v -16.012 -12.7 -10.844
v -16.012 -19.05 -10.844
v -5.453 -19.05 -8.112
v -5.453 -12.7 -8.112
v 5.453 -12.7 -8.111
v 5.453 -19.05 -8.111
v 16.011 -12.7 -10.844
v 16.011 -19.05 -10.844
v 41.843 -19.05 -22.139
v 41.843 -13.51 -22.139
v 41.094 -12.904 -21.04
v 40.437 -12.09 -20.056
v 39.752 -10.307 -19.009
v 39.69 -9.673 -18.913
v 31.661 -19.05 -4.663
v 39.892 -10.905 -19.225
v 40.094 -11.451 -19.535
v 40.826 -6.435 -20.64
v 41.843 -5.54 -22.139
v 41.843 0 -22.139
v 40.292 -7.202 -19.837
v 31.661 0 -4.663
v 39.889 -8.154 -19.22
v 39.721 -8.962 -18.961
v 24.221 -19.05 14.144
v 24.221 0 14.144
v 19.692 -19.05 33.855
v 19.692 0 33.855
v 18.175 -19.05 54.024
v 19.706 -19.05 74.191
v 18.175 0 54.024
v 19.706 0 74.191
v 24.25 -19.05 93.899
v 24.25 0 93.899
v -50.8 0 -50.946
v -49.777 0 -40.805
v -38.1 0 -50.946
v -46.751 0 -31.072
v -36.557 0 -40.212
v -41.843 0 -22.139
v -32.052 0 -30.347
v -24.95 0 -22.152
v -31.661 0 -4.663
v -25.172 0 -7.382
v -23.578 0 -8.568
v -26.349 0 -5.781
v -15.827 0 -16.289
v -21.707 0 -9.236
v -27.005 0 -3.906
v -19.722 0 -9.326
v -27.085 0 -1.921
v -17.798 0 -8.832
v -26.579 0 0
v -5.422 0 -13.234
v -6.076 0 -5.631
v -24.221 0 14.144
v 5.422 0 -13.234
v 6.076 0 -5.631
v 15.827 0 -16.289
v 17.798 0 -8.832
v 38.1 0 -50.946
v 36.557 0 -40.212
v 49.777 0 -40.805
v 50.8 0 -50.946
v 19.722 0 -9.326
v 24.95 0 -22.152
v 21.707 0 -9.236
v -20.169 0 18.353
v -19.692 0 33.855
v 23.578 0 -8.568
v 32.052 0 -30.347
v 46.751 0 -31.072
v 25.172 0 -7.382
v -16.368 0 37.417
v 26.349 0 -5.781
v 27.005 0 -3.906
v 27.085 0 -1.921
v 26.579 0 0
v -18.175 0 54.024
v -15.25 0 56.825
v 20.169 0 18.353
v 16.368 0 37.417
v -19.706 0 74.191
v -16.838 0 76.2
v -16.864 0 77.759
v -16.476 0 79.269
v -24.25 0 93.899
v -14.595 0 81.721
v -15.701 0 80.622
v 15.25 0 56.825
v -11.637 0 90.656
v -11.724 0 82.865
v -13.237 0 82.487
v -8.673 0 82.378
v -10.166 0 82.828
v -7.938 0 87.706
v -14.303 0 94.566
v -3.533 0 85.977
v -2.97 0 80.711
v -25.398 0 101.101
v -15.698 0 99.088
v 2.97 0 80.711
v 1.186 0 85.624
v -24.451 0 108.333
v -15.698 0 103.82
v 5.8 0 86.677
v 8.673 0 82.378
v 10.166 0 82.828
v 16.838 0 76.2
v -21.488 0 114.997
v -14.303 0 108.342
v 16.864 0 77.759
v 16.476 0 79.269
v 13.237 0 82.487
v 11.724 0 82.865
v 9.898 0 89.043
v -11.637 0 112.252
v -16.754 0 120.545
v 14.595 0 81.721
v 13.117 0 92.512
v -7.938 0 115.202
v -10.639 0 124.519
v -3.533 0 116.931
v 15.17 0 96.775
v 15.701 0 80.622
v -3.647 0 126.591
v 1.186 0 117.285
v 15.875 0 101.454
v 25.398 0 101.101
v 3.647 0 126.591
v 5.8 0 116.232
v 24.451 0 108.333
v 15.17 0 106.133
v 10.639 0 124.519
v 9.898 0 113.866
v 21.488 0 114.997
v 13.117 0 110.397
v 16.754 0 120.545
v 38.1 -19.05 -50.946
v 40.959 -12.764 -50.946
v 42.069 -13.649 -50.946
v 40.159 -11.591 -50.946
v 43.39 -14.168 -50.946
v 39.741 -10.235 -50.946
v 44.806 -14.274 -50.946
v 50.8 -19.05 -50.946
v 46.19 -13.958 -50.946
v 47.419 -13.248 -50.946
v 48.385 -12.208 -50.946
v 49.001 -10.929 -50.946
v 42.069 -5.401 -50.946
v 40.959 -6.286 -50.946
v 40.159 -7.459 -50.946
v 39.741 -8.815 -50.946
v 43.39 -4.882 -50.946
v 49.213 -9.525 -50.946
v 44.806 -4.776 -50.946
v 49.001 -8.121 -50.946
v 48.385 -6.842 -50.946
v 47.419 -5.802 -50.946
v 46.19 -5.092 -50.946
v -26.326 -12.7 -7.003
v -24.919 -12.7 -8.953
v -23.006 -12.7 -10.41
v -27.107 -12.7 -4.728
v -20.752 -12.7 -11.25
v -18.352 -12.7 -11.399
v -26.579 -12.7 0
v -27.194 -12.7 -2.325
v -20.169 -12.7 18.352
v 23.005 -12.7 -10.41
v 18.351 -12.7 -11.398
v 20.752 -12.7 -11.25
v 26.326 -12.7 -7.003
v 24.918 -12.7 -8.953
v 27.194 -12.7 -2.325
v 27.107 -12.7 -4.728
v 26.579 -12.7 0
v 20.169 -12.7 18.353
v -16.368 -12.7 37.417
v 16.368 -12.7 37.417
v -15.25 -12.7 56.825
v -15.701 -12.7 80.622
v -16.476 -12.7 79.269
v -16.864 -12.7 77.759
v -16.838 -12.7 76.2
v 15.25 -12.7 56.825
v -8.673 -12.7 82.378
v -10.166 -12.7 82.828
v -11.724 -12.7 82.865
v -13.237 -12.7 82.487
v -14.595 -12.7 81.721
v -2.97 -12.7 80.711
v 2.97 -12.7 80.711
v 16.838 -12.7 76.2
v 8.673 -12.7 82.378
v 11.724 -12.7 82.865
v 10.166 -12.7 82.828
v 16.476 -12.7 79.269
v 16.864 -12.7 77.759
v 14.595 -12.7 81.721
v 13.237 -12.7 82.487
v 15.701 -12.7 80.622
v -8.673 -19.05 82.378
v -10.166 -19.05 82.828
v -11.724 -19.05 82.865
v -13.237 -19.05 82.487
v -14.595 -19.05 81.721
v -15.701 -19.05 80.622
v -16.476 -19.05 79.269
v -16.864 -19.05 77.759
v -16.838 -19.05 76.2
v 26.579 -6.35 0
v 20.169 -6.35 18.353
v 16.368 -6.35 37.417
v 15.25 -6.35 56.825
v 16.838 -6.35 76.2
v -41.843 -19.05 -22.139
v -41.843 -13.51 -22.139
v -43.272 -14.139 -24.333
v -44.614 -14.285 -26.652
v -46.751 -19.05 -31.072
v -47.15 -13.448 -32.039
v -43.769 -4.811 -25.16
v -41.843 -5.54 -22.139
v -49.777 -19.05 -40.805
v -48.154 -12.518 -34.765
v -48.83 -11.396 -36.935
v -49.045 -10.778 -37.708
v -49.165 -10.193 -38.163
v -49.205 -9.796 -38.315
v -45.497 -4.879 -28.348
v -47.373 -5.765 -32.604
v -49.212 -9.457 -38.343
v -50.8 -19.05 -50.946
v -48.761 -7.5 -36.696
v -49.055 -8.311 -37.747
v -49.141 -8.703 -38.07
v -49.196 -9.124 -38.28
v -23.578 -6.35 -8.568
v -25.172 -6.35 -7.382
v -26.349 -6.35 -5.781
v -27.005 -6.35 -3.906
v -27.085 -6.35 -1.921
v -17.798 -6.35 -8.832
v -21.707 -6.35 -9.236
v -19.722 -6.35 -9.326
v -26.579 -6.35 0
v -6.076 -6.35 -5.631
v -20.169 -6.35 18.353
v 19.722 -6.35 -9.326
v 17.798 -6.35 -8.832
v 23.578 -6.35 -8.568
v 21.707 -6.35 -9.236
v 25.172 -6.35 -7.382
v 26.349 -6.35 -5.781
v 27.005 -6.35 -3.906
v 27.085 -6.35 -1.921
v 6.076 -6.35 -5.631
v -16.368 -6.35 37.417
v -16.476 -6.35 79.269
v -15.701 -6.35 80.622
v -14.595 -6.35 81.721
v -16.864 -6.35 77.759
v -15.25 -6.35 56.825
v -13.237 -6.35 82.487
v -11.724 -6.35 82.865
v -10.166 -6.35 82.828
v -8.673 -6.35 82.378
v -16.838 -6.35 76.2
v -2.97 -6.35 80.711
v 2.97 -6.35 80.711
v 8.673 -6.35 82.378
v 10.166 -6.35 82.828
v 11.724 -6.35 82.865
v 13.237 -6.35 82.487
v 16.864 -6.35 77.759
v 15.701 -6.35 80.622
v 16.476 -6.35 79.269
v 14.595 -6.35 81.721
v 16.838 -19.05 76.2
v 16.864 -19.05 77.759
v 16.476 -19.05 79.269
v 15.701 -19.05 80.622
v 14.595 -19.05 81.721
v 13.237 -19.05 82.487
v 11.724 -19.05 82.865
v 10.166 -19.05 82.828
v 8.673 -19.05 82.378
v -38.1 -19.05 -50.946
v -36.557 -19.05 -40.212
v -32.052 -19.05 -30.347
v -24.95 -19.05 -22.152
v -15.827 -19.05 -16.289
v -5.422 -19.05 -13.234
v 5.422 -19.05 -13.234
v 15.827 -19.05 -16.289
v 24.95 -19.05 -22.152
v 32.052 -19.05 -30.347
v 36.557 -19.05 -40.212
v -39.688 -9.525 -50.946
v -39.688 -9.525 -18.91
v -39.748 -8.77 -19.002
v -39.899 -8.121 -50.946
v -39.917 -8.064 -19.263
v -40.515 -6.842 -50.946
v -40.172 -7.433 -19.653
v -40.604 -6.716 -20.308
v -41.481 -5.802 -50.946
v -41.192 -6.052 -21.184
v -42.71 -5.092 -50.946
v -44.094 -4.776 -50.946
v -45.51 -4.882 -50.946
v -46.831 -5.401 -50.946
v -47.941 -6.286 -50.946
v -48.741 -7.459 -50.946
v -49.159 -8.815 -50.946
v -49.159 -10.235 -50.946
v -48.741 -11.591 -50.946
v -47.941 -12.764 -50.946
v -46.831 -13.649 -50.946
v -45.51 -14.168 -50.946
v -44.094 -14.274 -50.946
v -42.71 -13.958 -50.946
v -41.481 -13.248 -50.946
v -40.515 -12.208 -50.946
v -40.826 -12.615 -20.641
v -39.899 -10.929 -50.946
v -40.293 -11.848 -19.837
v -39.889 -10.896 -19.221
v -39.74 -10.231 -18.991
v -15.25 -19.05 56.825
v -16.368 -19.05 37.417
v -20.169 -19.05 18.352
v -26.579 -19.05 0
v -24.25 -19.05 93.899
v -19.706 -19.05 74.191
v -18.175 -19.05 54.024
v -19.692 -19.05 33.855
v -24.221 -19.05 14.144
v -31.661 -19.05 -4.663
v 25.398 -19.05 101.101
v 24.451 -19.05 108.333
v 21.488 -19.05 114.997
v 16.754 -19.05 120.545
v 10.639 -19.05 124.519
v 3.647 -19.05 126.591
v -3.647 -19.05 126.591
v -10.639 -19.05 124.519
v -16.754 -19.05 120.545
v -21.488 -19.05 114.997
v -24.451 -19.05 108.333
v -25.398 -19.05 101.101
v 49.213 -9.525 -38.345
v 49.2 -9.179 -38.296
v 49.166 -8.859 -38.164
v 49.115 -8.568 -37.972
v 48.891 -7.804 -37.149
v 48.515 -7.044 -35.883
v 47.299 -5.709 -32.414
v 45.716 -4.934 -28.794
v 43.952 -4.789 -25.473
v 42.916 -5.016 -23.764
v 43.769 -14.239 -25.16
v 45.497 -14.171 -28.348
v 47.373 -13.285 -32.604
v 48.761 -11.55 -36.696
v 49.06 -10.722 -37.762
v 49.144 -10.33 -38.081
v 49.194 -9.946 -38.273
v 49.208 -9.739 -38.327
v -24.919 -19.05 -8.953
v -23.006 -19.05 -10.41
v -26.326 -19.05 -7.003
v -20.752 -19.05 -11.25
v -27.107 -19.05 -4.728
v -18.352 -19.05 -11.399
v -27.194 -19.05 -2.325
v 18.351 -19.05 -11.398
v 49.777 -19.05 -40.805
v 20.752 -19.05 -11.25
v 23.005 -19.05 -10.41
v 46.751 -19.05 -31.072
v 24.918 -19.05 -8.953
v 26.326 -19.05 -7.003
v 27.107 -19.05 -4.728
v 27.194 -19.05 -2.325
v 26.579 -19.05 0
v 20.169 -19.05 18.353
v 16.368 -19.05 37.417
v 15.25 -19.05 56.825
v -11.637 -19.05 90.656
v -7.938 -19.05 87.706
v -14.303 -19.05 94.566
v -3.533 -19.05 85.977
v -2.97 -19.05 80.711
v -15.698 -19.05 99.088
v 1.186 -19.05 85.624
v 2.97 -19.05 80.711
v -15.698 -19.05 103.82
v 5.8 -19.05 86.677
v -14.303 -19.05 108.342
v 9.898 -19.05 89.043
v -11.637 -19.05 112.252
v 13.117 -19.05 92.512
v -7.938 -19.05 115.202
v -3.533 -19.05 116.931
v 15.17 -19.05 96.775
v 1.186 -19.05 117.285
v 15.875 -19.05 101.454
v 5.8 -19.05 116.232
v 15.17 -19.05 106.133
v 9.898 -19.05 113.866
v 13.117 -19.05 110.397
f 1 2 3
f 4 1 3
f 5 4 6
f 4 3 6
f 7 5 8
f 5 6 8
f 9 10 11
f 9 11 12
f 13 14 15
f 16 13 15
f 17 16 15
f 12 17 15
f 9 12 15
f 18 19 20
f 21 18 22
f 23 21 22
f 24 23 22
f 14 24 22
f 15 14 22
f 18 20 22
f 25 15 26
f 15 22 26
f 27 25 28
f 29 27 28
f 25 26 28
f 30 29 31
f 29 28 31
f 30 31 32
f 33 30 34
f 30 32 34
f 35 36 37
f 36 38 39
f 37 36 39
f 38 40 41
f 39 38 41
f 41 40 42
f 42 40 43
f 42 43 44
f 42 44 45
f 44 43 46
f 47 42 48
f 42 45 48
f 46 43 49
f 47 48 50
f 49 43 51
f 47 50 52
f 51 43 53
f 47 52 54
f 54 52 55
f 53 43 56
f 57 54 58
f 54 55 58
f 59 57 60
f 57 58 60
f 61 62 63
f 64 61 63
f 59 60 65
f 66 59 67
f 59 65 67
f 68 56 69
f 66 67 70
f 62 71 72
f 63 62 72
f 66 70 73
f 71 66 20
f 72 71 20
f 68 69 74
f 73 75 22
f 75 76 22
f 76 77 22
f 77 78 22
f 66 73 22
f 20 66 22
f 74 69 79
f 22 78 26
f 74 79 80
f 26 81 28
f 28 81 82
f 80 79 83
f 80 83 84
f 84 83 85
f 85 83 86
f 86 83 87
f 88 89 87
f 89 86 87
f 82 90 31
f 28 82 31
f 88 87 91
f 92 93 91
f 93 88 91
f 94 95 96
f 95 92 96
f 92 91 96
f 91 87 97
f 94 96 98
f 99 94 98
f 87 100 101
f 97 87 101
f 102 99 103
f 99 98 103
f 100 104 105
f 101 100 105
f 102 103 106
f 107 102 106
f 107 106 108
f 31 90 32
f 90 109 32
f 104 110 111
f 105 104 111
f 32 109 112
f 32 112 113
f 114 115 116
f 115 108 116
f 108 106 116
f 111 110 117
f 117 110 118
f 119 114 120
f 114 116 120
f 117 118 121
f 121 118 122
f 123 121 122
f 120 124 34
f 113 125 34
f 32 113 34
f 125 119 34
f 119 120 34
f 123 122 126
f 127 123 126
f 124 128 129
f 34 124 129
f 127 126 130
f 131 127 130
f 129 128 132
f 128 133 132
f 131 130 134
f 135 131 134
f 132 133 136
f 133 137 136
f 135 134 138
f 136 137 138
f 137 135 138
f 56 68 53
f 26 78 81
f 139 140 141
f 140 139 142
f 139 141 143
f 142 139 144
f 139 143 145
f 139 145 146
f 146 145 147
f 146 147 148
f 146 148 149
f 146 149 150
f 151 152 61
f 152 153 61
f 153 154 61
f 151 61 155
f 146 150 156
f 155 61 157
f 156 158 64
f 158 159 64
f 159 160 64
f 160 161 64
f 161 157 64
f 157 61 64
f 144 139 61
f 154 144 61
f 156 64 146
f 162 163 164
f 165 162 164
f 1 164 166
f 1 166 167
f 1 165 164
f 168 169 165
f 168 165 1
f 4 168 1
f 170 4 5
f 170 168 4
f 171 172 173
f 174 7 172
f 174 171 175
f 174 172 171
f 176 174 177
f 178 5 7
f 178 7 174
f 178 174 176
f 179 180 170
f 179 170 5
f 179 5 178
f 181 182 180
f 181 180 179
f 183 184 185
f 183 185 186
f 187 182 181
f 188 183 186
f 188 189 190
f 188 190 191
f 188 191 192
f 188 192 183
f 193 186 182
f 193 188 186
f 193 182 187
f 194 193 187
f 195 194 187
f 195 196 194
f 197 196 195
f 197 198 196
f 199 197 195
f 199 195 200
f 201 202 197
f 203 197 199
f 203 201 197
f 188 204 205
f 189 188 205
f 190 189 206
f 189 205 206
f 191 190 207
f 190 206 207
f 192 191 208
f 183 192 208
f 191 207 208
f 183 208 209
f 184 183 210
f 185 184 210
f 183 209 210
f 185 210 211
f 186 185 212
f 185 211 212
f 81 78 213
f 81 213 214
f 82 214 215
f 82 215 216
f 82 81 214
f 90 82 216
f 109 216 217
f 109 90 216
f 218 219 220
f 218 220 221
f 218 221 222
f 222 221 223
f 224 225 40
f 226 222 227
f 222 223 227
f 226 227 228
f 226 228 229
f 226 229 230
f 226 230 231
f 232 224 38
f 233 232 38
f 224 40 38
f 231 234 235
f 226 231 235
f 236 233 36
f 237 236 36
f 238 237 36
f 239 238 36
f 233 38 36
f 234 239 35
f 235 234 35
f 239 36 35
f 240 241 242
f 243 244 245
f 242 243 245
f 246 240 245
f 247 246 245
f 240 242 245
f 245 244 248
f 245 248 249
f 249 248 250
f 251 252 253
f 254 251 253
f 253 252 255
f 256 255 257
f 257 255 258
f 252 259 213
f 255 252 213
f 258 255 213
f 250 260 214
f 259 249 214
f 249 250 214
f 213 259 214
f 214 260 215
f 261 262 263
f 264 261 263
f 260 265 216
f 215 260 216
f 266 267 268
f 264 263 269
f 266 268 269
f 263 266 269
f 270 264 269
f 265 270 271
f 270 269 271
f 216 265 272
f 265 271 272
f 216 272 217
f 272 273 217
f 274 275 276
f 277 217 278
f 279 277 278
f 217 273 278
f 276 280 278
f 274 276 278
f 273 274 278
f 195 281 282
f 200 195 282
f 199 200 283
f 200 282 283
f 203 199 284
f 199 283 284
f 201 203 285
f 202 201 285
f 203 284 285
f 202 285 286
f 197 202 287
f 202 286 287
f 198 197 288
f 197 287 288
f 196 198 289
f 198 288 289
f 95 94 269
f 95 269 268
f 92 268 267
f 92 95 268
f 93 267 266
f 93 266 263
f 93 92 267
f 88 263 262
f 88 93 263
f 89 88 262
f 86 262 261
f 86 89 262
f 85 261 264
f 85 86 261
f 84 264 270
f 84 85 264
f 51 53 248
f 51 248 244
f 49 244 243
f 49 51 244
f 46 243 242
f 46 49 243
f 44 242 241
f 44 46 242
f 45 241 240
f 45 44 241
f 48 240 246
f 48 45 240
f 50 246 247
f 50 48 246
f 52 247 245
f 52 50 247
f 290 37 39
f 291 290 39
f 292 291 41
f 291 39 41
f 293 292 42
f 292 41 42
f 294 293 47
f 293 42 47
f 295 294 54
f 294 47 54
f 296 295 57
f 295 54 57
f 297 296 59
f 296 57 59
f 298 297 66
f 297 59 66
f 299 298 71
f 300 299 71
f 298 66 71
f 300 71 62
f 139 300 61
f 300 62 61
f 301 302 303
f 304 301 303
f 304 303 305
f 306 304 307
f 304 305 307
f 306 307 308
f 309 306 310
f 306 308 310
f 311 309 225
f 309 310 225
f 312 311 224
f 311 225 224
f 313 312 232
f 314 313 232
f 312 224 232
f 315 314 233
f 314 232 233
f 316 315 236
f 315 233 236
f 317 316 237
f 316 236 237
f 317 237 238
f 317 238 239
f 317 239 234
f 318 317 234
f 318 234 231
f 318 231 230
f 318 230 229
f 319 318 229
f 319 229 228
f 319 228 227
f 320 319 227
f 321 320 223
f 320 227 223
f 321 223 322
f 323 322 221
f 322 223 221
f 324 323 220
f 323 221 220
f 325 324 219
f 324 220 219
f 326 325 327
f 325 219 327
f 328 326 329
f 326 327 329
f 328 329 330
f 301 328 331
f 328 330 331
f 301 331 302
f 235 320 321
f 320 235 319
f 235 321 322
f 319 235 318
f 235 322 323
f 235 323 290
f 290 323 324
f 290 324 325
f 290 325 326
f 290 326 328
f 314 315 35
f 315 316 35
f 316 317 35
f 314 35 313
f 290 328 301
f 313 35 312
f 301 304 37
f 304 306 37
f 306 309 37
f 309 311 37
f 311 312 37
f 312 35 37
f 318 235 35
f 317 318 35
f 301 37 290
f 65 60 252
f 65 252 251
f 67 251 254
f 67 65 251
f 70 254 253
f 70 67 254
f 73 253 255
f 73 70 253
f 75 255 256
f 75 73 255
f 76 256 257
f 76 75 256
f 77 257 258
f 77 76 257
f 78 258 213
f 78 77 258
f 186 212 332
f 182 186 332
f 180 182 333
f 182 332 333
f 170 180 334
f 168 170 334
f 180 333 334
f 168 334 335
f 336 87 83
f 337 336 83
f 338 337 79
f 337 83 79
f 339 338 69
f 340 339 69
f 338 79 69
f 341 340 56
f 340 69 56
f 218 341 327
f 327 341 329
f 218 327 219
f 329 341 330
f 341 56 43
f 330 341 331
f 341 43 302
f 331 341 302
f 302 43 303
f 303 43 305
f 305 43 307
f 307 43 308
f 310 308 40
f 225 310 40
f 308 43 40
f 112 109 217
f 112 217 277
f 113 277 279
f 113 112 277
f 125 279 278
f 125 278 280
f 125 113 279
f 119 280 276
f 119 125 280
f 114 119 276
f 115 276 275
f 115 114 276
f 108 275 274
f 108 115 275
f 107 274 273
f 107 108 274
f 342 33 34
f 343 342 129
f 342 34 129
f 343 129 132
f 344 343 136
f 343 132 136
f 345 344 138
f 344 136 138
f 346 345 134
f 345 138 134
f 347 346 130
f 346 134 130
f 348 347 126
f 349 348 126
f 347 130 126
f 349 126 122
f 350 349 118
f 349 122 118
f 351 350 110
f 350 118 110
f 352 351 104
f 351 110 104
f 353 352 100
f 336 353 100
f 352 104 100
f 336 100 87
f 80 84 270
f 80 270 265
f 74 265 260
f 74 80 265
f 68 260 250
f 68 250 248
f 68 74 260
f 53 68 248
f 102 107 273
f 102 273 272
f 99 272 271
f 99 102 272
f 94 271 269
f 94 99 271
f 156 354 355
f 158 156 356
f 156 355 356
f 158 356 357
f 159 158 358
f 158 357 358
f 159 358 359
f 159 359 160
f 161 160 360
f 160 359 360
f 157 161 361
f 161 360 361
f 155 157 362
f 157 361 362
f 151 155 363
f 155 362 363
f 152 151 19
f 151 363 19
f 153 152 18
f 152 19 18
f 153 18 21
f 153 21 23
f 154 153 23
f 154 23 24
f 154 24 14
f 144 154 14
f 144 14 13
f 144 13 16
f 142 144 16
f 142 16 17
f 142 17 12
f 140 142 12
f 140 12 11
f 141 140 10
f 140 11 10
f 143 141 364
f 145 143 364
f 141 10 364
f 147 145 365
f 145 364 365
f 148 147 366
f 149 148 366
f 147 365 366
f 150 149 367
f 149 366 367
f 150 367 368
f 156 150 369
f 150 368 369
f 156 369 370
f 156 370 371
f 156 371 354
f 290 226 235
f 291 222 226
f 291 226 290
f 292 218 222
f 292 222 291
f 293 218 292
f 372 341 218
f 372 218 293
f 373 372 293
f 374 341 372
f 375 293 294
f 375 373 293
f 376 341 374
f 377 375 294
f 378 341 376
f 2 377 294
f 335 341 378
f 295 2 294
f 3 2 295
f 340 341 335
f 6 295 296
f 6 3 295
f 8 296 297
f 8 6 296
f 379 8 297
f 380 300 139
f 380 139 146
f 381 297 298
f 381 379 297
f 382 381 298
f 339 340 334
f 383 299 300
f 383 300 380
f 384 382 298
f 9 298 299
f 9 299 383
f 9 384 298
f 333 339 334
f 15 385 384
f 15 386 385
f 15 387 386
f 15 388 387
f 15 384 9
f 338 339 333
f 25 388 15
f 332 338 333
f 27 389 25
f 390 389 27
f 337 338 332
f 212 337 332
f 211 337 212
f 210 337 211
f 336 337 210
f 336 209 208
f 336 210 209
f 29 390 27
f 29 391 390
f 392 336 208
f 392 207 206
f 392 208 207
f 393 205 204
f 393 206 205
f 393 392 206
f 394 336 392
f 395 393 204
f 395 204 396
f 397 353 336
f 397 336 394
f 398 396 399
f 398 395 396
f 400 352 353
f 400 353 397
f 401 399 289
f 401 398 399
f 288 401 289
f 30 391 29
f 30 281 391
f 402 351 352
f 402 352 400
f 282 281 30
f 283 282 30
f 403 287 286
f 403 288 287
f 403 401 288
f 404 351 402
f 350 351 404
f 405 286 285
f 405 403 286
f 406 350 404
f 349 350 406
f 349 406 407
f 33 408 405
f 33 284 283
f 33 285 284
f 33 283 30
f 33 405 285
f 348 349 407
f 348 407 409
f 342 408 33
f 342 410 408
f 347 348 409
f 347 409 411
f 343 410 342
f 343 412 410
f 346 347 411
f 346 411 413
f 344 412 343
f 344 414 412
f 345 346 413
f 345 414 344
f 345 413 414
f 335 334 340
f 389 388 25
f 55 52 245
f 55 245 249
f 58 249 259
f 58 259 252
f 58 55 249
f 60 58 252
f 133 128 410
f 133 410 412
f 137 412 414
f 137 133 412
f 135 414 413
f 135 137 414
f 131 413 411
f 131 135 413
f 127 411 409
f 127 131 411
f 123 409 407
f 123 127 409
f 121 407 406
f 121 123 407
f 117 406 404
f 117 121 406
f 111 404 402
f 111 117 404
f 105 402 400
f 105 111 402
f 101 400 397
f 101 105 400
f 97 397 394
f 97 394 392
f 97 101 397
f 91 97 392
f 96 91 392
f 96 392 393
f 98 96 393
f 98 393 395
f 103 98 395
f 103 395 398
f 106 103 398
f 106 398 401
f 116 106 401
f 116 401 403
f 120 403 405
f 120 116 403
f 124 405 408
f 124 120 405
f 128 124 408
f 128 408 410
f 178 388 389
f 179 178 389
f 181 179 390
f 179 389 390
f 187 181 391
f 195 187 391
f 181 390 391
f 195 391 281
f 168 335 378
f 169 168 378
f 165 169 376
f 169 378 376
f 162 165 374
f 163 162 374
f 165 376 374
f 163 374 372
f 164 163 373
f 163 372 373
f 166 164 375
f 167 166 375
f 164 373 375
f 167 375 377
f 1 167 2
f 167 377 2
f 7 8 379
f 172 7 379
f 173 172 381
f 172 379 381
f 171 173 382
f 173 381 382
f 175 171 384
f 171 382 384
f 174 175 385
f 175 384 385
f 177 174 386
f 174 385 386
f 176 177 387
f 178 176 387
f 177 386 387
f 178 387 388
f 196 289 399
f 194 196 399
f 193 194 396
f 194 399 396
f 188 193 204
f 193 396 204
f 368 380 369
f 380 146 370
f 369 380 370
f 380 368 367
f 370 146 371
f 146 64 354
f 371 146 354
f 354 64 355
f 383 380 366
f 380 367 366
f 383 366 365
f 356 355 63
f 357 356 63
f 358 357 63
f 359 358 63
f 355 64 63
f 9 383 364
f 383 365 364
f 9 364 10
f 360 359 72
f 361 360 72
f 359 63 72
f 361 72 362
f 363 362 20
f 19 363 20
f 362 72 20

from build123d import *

# Parameters (mm, degrees)
F0_R     = 15.875
F1_DEPTH = 19.05
F2_R     = 4.7625
F3_DEPTH = 53.975
F5_DEPTH = 6.35
F7_DEPTH = 6.35


with BuildPart() as f1:
    # F0 (on Front) → F1 (new body)
    with BuildSketch(Plane.XZ):
        with BuildLine():
            ThreePointArc((-24.250386, 93.899172), (-19.6918, 33.855441), (-41.842636, -22.138942))
            ThreePointArc((-41.842636, -22.138942), (-48.508999, -35.86211), (-50.8, -50.945779))
            Line((-50.8, -50.945779), (-38.1, -50.945779))
            ThreePointArc((-38.1, -50.945779), (0, -12.845779), (38.1, -50.945779))
            Line((38.1, -50.945779), (50.8, -50.945779))
            ThreePointArc((50.8, -50.945779), (48.508999, -35.86211), (41.842636, -22.138942))
            ThreePointArc((41.842636, -22.138942), (19.6918, 33.855441), (24.250386, 93.899172))
            ThreePointArc((24.250386, 93.899172), (0, 126.854221), (-24.250386, 93.899172))
        make_face()
        with Locations((0, 101.454221)):
            Circle(F0_R, mode=Mode.SUBTRACT)
    extrude(amount=F1_DEPTH)

    # F2 (on Top) → F3 (cut)
    with BuildSketch(Plane.XY):
        with Locations((-44.45, -9.525)):
            Circle(F2_R)
        with Locations((44.45, -9.525)):
            Circle(F2_R)
    extrude(amount=-F3_DEPTH, mode=Mode.SUBTRACT)

    # F4 (on Front) → F5 (cut)
    with BuildSketch(Plane.XZ):
        with BuildLine():
            ThreePointArc((-16.837664, 76.2), (-16.367797, 37.417239), (-26.57924, 0))
            ThreePointArc((-26.57924, 0), (-25.171809, -7.381909), (-17.79823, -8.832344))
            ThreePointArc((-17.79823, -8.832344), (0, -5.225779), (17.79823, -8.832344))
            ThreePointArc((17.79823, -8.832344), (25.171809, -7.381909), (26.57924, 0))
            ThreePointArc((26.57924, 0), (16.367797, 37.417239), (16.837664, 76.2))
            ThreePointArc((16.837664, 76.2), (14.595118, 81.720839), (8.67256, 82.378091))
            ThreePointArc((8.67256, 82.378091), (0, 80.499221), (-8.67256, 82.378091))
            ThreePointArc((-8.67256, 82.378091), (-14.595118, 81.720839), (-16.837664, 76.2))
        make_face()
    extrude(amount=F5_DEPTH, mode=Mode.SUBTRACT)

    # F6 (on face) → F7 (cut)
    with BuildSketch(Plane.XZ.offset(19.05)):
        with BuildLine():
            ThreePointArc((-16.837665, 76.200008), (-16.367858, 37.417212), (-26.579377, -4.3e-05))
            ThreePointArc((-26.579377, -4.3e-05), (-24.918717, -8.953005), (-16.011589, -10.84414))
            ThreePointArc((-16.011589, -10.84414), (-0.00013, -7.765779), (16.011348, -10.844044))
            ThreePointArc((16.011348, -10.844044), (24.918437, -8.952885), (26.579103, 4.3e-05))
            ThreePointArc((26.579103, 4.3e-05), (16.367736, 37.417266), (16.837662, 76.199992))
            ThreePointArc((16.837662, 76.199992), (14.595121, 81.720837), (8.67256, 82.378091))
            ThreePointArc((8.67256, 82.378091), (0, 80.499221), (-8.67256, 82.378091))
            ThreePointArc((-8.67256, 82.378091), (-14.595115, 81.720842), (-16.837665, 76.200008))
        make_face()
    extrude(amount=-F7_DEPTH, mode=Mode.SUBTRACT)


solid = f1.part
